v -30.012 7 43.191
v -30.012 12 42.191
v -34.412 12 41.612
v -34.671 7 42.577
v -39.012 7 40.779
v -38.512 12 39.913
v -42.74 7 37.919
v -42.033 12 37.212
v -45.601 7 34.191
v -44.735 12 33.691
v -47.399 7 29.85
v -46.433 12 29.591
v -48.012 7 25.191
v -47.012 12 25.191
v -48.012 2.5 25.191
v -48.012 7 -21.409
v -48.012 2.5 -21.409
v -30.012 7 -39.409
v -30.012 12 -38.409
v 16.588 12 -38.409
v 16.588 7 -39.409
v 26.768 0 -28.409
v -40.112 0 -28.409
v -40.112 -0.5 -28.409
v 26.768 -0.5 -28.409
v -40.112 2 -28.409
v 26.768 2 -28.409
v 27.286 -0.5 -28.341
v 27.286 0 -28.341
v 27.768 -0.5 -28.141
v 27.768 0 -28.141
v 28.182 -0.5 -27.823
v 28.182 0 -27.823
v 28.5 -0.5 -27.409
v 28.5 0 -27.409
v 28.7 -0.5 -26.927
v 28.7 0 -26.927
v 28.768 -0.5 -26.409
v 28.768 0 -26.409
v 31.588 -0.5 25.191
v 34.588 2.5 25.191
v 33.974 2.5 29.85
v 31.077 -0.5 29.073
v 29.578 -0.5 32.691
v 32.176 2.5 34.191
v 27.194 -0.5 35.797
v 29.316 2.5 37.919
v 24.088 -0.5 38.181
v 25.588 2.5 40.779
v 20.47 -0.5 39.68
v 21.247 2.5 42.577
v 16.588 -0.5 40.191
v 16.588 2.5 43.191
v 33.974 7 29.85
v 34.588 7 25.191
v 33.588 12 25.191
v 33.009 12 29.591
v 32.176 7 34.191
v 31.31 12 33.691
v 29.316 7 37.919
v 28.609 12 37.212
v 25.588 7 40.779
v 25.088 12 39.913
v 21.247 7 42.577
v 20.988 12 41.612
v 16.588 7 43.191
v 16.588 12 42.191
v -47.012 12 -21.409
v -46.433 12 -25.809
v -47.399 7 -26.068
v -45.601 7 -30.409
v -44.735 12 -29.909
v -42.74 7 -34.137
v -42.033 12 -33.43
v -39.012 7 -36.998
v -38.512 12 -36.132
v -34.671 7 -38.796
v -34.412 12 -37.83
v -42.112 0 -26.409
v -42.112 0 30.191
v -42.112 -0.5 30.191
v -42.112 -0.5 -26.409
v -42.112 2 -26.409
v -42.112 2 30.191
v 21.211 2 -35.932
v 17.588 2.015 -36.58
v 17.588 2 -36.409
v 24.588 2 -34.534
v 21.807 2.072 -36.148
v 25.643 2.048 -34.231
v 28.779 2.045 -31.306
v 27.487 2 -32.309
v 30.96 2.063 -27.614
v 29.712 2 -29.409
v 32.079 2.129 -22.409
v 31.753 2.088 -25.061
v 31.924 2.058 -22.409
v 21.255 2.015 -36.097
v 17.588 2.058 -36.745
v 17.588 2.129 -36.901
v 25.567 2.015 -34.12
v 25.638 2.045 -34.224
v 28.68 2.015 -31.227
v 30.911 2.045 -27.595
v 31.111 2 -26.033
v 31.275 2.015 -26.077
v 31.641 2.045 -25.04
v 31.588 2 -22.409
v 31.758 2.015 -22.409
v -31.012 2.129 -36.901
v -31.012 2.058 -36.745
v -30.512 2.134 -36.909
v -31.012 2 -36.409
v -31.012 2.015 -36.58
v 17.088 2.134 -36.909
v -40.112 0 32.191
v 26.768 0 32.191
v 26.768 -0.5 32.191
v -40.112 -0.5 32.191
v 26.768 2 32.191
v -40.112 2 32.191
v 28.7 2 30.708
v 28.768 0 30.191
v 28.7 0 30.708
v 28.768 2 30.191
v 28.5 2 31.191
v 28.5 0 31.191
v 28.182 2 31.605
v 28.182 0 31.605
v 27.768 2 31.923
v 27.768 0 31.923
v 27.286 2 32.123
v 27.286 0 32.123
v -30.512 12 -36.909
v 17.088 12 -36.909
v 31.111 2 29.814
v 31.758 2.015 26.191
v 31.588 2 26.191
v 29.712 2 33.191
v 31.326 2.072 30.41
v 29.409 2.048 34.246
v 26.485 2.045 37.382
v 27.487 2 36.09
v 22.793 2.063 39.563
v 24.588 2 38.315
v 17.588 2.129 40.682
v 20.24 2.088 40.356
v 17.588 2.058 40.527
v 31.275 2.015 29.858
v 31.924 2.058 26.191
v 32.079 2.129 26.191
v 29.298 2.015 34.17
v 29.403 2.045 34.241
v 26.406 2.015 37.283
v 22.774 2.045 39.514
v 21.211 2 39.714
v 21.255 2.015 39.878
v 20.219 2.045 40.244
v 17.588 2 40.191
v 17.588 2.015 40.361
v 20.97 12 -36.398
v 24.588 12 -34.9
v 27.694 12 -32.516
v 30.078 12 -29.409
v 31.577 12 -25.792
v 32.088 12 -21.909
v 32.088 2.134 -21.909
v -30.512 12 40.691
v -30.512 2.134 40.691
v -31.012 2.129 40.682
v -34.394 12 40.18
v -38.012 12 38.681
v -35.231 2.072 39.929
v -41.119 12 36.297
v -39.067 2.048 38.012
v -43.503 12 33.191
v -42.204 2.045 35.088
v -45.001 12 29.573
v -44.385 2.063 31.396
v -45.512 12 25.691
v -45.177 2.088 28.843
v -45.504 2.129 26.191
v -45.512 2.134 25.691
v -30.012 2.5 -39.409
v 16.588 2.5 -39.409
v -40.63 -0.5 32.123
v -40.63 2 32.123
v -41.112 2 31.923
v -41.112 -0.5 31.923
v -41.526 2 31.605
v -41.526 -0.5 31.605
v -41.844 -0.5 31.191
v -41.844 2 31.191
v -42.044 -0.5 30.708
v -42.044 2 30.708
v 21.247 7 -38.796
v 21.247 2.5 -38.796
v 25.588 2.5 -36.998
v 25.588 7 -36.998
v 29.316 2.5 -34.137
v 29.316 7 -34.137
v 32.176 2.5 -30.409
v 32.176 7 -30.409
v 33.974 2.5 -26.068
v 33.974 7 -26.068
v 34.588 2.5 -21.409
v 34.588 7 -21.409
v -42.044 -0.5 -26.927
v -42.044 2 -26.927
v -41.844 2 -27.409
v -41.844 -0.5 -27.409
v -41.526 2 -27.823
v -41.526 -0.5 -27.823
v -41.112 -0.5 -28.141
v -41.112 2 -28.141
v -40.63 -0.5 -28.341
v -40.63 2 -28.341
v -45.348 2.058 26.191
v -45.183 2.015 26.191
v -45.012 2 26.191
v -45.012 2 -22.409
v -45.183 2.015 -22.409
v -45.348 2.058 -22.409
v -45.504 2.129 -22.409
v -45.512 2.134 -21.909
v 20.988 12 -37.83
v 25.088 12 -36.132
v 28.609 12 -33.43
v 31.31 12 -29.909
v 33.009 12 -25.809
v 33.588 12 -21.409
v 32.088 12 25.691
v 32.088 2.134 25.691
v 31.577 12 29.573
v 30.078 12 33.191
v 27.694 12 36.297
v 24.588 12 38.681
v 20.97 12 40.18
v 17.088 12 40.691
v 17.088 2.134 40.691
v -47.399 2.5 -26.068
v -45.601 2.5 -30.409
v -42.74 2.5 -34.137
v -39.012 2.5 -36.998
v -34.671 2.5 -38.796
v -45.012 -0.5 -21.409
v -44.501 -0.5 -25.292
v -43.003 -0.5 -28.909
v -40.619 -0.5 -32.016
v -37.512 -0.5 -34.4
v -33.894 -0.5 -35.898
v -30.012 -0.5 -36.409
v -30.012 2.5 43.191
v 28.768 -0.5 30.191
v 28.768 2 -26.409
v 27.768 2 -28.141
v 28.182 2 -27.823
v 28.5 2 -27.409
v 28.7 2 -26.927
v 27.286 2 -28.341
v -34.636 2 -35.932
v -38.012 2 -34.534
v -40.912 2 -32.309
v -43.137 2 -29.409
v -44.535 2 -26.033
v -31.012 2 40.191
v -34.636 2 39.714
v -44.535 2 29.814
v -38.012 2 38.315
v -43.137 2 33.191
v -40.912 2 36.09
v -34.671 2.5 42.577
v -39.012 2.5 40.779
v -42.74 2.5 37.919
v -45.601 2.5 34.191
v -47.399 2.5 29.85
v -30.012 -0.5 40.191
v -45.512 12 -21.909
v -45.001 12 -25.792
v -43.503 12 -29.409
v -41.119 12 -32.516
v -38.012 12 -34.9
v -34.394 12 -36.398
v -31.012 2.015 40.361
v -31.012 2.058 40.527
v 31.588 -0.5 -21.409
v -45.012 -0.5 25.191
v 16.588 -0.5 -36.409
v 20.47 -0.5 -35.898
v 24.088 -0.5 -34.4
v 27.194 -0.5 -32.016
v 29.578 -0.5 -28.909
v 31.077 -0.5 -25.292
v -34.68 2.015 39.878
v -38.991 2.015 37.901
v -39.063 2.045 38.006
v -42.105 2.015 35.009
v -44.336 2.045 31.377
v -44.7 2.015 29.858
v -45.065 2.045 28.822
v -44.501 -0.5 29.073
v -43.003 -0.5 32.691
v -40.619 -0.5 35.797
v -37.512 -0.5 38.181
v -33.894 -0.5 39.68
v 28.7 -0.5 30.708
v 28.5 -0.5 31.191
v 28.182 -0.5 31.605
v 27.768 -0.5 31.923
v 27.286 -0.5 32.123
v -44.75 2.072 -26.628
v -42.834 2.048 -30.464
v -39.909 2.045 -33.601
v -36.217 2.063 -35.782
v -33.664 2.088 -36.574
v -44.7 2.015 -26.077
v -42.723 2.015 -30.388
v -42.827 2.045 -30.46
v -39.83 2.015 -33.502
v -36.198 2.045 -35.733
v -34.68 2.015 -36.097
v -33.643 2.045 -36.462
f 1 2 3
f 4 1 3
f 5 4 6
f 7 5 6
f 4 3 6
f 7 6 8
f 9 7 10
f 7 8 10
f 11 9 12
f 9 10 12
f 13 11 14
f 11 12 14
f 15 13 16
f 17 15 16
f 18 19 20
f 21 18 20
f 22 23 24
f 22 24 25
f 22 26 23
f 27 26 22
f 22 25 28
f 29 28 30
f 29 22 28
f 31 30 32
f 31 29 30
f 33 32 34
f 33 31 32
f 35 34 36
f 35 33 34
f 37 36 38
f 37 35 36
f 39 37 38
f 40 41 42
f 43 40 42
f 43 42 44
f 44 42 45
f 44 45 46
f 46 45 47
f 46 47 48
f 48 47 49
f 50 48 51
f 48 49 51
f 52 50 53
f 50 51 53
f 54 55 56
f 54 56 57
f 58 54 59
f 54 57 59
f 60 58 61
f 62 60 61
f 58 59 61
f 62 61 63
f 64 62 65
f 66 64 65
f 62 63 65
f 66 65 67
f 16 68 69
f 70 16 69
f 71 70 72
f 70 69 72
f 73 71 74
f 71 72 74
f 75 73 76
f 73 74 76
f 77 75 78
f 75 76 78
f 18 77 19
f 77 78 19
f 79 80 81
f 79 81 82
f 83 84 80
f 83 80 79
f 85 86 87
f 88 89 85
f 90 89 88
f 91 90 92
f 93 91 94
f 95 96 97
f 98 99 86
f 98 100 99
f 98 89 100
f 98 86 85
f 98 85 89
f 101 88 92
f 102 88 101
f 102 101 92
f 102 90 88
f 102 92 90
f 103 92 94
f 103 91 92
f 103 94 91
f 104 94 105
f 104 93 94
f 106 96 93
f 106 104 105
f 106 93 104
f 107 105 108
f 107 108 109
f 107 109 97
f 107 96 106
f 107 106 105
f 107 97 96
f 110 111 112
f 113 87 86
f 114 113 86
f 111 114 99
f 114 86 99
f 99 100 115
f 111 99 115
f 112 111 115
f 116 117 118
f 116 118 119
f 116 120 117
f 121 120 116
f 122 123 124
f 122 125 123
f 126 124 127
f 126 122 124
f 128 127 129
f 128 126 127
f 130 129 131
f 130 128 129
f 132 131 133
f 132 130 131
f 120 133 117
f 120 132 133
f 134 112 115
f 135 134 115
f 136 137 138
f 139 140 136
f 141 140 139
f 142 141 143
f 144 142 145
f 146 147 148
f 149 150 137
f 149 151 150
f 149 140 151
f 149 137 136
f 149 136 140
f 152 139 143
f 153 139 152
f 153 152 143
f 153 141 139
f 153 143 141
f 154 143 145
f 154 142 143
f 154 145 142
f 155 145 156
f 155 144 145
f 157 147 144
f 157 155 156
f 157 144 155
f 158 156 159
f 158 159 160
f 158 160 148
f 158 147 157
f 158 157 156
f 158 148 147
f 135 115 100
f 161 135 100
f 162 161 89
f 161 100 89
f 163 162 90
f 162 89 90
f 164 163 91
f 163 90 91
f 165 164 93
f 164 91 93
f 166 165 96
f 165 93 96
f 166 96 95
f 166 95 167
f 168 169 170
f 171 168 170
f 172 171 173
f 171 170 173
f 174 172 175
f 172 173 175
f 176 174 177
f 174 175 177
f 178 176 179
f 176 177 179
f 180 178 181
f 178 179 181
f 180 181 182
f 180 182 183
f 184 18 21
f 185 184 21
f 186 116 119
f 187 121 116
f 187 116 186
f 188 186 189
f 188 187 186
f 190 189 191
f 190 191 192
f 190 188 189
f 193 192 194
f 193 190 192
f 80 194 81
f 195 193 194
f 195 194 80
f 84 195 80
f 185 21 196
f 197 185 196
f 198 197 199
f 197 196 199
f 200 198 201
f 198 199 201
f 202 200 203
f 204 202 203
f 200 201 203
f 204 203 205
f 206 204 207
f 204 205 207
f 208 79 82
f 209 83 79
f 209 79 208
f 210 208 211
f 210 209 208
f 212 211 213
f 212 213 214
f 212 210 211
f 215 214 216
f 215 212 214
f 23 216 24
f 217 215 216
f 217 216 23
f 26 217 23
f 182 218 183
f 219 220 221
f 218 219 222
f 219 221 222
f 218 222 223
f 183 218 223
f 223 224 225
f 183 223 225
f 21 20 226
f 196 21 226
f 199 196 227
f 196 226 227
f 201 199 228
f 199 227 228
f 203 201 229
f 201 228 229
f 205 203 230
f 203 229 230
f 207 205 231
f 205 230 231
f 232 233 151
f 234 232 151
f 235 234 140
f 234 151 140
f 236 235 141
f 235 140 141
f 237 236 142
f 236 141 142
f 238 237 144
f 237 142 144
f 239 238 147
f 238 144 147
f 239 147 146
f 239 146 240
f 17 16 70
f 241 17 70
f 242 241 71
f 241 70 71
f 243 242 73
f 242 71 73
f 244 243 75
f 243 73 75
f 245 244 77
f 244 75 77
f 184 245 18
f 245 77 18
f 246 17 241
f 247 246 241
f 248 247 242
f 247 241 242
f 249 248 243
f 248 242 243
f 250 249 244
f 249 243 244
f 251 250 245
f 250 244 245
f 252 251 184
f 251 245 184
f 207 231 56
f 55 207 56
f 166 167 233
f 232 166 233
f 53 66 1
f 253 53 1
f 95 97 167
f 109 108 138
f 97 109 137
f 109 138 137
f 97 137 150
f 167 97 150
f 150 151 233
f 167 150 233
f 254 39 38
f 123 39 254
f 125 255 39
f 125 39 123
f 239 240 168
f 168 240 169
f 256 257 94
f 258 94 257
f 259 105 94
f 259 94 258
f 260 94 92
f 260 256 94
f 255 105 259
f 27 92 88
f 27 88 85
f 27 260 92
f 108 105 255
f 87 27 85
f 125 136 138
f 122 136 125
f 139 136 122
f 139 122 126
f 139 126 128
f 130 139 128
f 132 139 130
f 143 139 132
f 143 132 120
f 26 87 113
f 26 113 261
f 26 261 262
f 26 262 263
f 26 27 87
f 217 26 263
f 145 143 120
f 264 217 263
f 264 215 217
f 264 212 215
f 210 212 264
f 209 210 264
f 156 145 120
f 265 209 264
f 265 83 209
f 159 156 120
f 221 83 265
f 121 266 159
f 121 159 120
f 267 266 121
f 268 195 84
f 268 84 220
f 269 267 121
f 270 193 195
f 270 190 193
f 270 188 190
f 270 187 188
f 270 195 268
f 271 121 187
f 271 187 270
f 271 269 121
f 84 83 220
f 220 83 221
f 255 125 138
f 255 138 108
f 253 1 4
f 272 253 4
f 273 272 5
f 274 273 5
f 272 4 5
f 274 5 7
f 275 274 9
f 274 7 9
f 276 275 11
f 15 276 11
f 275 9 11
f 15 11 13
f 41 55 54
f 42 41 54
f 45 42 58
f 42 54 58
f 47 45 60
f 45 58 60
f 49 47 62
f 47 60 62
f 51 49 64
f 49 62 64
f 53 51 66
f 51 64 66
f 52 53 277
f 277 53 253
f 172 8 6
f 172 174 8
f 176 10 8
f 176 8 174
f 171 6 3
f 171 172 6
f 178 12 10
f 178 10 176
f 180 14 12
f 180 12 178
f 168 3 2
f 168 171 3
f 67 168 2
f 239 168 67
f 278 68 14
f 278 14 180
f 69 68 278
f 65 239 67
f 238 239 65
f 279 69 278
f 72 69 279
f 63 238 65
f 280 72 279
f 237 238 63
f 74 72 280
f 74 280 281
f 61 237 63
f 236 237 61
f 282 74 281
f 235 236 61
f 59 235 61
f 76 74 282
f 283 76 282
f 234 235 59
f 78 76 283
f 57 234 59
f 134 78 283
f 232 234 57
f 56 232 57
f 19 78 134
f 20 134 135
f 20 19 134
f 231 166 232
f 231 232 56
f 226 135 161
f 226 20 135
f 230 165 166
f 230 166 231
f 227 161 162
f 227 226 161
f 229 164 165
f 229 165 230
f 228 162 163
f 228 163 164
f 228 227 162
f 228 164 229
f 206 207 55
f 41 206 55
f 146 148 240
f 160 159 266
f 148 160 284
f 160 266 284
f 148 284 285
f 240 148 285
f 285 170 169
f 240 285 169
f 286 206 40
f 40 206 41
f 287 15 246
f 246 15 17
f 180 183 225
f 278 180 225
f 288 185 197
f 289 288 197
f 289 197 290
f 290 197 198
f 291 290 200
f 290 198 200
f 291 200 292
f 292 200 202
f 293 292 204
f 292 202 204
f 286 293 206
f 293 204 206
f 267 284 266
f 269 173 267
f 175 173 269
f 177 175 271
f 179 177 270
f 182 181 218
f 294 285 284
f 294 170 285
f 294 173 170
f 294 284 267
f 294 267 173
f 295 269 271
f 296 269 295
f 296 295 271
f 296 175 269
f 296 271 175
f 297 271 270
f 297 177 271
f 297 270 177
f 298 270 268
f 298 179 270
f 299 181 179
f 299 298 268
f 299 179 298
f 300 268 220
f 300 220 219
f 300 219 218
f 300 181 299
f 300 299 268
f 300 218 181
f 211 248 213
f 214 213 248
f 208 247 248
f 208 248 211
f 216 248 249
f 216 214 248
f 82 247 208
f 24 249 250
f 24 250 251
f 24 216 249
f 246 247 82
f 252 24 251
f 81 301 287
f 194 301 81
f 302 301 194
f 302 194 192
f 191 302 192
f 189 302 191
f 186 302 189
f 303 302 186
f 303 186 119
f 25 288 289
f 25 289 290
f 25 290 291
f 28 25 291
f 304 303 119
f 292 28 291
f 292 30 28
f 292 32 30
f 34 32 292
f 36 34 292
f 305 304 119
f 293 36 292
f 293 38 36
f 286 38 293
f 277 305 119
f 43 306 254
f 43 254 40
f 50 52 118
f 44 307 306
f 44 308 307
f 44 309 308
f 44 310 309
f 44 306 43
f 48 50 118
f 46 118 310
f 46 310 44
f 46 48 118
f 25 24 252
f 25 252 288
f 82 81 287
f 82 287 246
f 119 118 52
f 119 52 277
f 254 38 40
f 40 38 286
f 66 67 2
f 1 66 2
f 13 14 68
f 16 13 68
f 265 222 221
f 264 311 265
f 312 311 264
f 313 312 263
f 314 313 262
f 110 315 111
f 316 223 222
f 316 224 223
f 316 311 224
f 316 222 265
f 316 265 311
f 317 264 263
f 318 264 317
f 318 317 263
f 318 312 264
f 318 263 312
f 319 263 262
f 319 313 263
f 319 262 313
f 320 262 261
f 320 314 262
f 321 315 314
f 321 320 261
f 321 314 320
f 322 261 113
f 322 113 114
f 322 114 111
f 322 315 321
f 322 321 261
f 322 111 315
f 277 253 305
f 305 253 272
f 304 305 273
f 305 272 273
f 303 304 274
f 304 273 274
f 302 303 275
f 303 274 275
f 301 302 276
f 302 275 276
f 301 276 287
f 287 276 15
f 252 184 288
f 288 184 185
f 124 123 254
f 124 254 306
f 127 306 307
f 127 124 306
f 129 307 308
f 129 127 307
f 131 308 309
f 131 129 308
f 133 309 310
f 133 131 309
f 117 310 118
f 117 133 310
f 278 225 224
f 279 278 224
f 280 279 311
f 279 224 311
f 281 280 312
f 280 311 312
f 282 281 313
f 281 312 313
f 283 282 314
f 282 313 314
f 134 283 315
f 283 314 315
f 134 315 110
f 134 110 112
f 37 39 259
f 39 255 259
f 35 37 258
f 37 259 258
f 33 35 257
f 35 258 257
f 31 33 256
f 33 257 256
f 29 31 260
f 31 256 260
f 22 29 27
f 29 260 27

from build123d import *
from OCP.BRepFilletAPI import BRepFilletAPI_MakeChamfer

# Parameters (mm, degrees)
BOSS_EXTRUDE1_DEPTH = 12
BOSS_EXTRUDE2_DEPTH = 2
BOSS_EXTRUDE3_DEPTH = 2
FILLET1_R           = 1
CHAMFER2_SIZE       = 5
CHAMFER2_SIZE2      = 1
BOSS_EXTRUDE4_START = -2
SKETCH3_W           = 1.836045909
SKETCH3_H           = 61.241929872
SKETCH3_W_2         = 2.002550415
SKETCH3_H_2         = 60.908326167
BOSS_EXTRUDE4_DEPTH = 2
FILLET2_R           = 2
BOSS_EXTRUDE6_DEPTH = 0.5
CHAMFER3_SIZE       = 3
BOSS_EXTRUDE7_START = -9.956145
BOSS_EXTRUDE7_DEPTH = 9.956145


with BuildPart() as part:
    # Sketch1 → Boss-Extrude1 (new body)
    with BuildSketch(Plane(origin=(0, 0, 0), x_dir=(1, 0, 0), z_dir=(0, 1, 0))):
        with BuildLine():
            Line((-30.01220756, 39.409237307), (16.58779244, 39.409237307))
            ThreePointArc((16.58779244, 39.409237307), (29.315714501, 34.137159368), (34.58779244, 21.409237307))
            Line((34.58779244, 21.409237307), (34.58779244, -25.190762693))
            ThreePointArc((34.58779244, -25.190762693), (29.315714501, -37.918684754), (16.58779244, -43.190762693))
            Line((16.58779244, -43.190762693), (-30.01220756, -43.190762693))
            ThreePointArc((-30.01220756, -43.190762693), (-42.740129621, -37.918684754), (-48.01220756, -25.190762693))
            Line((-48.01220756, -25.190762693), (-48.01220756, 21.409237307))
            ThreePointArc((-48.01220756, 21.409237307), (-42.740129621, 34.137159368), (-30.01220756, 39.409237307))
        make_face()
        with BuildLine():
            ThreePointArc((-31.01220756, 37.409237307), (-41.618809278, 33.015839025), (-46.01220756, 22.409237307))
            Line((-46.01220756, 22.409237307), (-46.01220756, -26.190762693))
            ThreePointArc((-46.01220756, -26.190762693), (-41.618809278, -36.797364411), (-31.01220756, -41.190762693))
            Line((-31.01220756, -41.190762693), (17.58779244, -41.190762693))
            ThreePointArc((17.58779244, -41.190762693), (28.194394158, -36.797364411), (32.58779244, -26.190762693))
            Line((32.58779244, -26.190762693), (32.58779244, 22.409237307))
            ThreePointArc((32.58779244, 22.409237307), (28.194394158, 33.015839025), (17.58779244, 37.409237307))
            Line((17.58779244, 37.409237307), (-31.01220756, 37.409237307))
        make_face(mode=Mode.SUBTRACT)
    extrude(amount=BOSS_EXTRUDE1_DEPTH)

    # Sketch1<3> → Boss-Extrude2 (add)
    with BuildSketch(Plane(origin=(0, 0, 0), x_dir=(1, 0, 0), z_dir=(0, 1, 0))):
        with BuildLine():
            Line((-31.01220756, 37.409237307), (17.58779244, 37.409237307))
            ThreePointArc((17.58779244, 37.409237307), (28.194394158, 33.015839025), (32.58779244, 22.409237307))
            Line((32.58779244, 22.409237307), (32.58779244, -26.190762693))
            ThreePointArc((32.58779244, -26.190762693), (28.194394158, -36.797364411), (17.58779244, -41.190762693))
            Line((17.58779244, -41.190762693), (-31.01220756, -41.190762693))
            ThreePointArc((-31.01220756, -41.190762693), (-41.618809278, -36.797364411), (-46.01220756, -26.190762693))
            Line((-46.01220756, -26.190762693), (-46.01220756, 22.409237307))
            ThreePointArc((-46.01220756, 22.409237307), (-41.618809278, 33.015839025), (-31.01220756, 37.409237307))
        make_face()
        with BuildLine():
            ThreePointArc((-33.01220756, 35.409237307), (-40.790382153, 32.1874119), (-44.01220756, 24.409237307))
            Line((-44.01220756, 24.409237307), (-44.01220756, -28.190762693))
            ThreePointArc((-44.01220756, -28.190762693), (-40.790382153, -35.968937286), (-33.01220756, -39.190762693))
            Line((-33.01220756, -39.190762693), (19.58779244, -39.190762693))
            ThreePointArc((19.58779244, -39.190762693), (27.365967033, -35.968937286), (30.58779244, -28.190762693))
            Line((30.58779244, -28.190762693), (30.58779244, 24.409237307))
            ThreePointArc((30.58779244, 24.409237307), (27.365967033, 32.1874119), (19.58779244, 35.409237307))
            Line((19.58779244, 35.409237307), (-33.01220756, 35.409237307))
        make_face(mode=Mode.SUBTRACT)
    extrude(amount=BOSS_EXTRUDE2_DEPTH)

    # Sketch2 → Boss-Extrude3 (add)
    with BuildSketch(Plane.XZ):
        Polygon((-43.965284719, -28.409237307), (31.645799766, -28.409237307), (28.962058079, -33.229552195), (23.454257131, -35.92314828), (-39.267624427, -35.92314828), (-41.596405872, -34.261761517), align=None)
        Polygon((-43.464319503, 32.190762693), (31.986692978, 32.190762693), (24.084814063, 40.906543889), (12.932368974, 40.906543889), (-33.320922397, 40.906543889), (-40.968109046, 37.811254055), align=None)
    extrude(amount=-BOSS_EXTRUDE3_DEPTH)

    # Fillet1
    fillet1_edges = [part.edges().sort_by_distance(p)[0] for p in [
        (-6.71220756, 2, -37.409237307),
        (32.58779244, 2, 1.890762693),
        (28.194394158, 2, -33.015839025),
        (-41.618809278, 2, -33.015839025),
        (-46.01220756, 2, 1.890762693),
        (-41.618809278, 2, 36.797364411),
        (-6.71220756, 2, 41.190762693),
        (28.194394158, 2, 36.797364411),
    ]]
    fillet(fillet1_edges, radius=FILLET1_R)

    # Chamfer2: one chamfer whose edges measure the first distance from different faces: ONE call of the kernel's chamfer builder (chamfer() names one face for all edges)
    chamfer2_edges_1 = [part.edges().sort_by_distance(p)[0] for p in [
        (-6.71220756, 12, -39.409237307),
    ]]
    chamfer2_side_1 = [part.faces().sort_by_distance(p)[0] for p in [
        (-6.71220756, 6, -39.409237307),
    ]]
    chamfer2_edges_2 = [part.edges().sort_by_distance(p)[0] for p in [
        (-42.740129621, 12, -34.137159368),
    ]]
    chamfer2_side_2 = [part.faces().sort_by_distance(p)[0] for p in [
        (-42.740129621, 6, -34.137159368),
    ]]
    chamfer2_edges_3 = [part.edges().sort_by_distance(p)[0] for p in [
        (-48.01220756, 12, 1.890762693),
    ]]
    chamfer2_side_3 = [part.faces().sort_by_distance(p)[0] for p in [
        (-48.01220756, 6, 1.890762693),
    ]]
    chamfer2_edges_4 = [part.edges().sort_by_distance(p)[0] for p in [
        (-42.740129621, 12, 37.918684754),
    ]]
    chamfer2_side_4 = [part.faces().sort_by_distance(p)[0] for p in [
        (-42.740129621, 6, 37.918684754),
    ]]
    chamfer2_edges_5 = [part.edges().sort_by_distance(p)[0] for p in [
        (-6.71220756, 12, 43.190762693),
    ]]
    chamfer2_side_5 = [part.faces().sort_by_distance(p)[0] for p in [
        (-6.71220756, 6, 43.190762693),
    ]]
    chamfer2_edges_6 = [part.edges().sort_by_distance(p)[0] for p in [
        (29.315714501, 12, 37.918684754),
    ]]
    chamfer2_side_6 = [part.faces().sort_by_distance(p)[0] for p in [
        (29.315714501, 6, 37.918684754),
    ]]
    chamfer2_edges_7 = [part.edges().sort_by_distance(p)[0] for p in [
        (34.58779244, 12, 1.890762693),
    ]]
    chamfer2_side_7 = [part.faces().sort_by_distance(p)[0] for p in [
        (34.58779244, 6, 1.890762693),
    ]]
    chamfer2_edges_8 = [part.edges().sort_by_distance(p)[0] for p in [
        (29.315714501, 12, -34.137159368),
    ]]
    chamfer2_side_8 = [part.faces().sort_by_distance(p)[0] for p in [
        (29.315714501, 6, -34.137159368),
    ]]
    chamfer2 = BRepFilletAPI_MakeChamfer(part.part.solid().wrapped)
    for e in chamfer2_edges_1:
        chamfer2.Add(CHAMFER2_SIZE, CHAMFER2_SIZE2, e.wrapped, chamfer2_side_1[0].wrapped)  # the first distance lies on this face
    for e in chamfer2_edges_2:
        chamfer2.Add(CHAMFER2_SIZE, CHAMFER2_SIZE2, e.wrapped, chamfer2_side_2[0].wrapped)  # the first distance lies on this face
    for e in chamfer2_edges_3:
        chamfer2.Add(CHAMFER2_SIZE, CHAMFER2_SIZE2, e.wrapped, chamfer2_side_3[0].wrapped)  # the first distance lies on this face
    for e in chamfer2_edges_4:
        chamfer2.Add(CHAMFER2_SIZE, CHAMFER2_SIZE2, e.wrapped, chamfer2_side_4[0].wrapped)  # the first distance lies on this face
    for e in chamfer2_edges_5:
        chamfer2.Add(CHAMFER2_SIZE, CHAMFER2_SIZE2, e.wrapped, chamfer2_side_5[0].wrapped)  # the first distance lies on this face
    for e in chamfer2_edges_6:
        chamfer2.Add(CHAMFER2_SIZE, CHAMFER2_SIZE2, e.wrapped, chamfer2_side_6[0].wrapped)  # the first distance lies on this face
    for e in chamfer2_edges_7:
        chamfer2.Add(CHAMFER2_SIZE, CHAMFER2_SIZE2, e.wrapped, chamfer2_side_7[0].wrapped)  # the first distance lies on this face
    for e in chamfer2_edges_8:
        chamfer2.Add(CHAMFER2_SIZE, CHAMFER2_SIZE2, e.wrapped, chamfer2_side_8[0].wrapped)  # the first distance lies on this face
    add(Compound.cast(chamfer2.Shape()), mode=Mode.REPLACE)

    # Sketch3 → Boss-Extrude4 (add)
    with BuildSketch(Plane.XZ.offset(BOSS_EXTRUDE4_START)):
        with Locations((29.686081831, 1.878123924)):
            Rectangle(SKETCH3_W, SKETCH3_H)
        with Locations((-43.113419178, 2.044925776)):
            Rectangle(SKETCH3_W_2, SKETCH3_H_2)
    extrude(amount=BOSS_EXTRUDE4_DEPTH)

    # Fillet2
    fillet2_edges = [part.edges().sort_by_distance(p)[0] for p in [
        (28.768058876, 1, 32.190762693),
        (28.768058876, 1, -28.409237307),
        (-42.11214397, 1, 32.190762693),
        (-42.11214397, 1, -28.409237307),
    ]]
    fillet(fillet2_edges, radius=FILLET2_R)

    # Sketch4 → Boss-Extrude6 (add)
    with BuildSketch(Plane.XZ):
        with BuildLine():
            Line((-30.01220756, -39.409237307), (16.58779244, -39.409237307))
            ThreePointArc((16.58779244, -39.409237307), (29.315714501, -34.137159368), (34.58779244, -21.409237307))
            Line((34.58779244, -21.409237307), (34.58779244, 25.190762693))
            ThreePointArc((34.58779244, 25.190762693), (29.315714501, 37.918684754), (16.58779244, 43.190762693))
            Line((16.58779244, 43.190762693), (-30.01220756, 43.190762693))
            ThreePointArc((-30.01220756, 43.190762693), (-42.740129621, 37.918684754), (-48.01220756, 25.190762693))
            Line((-48.01220756, 25.190762693), (-48.01220756, -21.409237307))
            ThreePointArc((-48.01220756, -21.409237307), (-42.740129621, -34.137159368), (-30.01220756, -39.409237307))
        make_face()
        with BuildLine():
            Line((-40.11214397, -28.409237307), (26.768058876, -28.409237307))
            ThreePointArc((26.768058876, -28.409237307), (28.182272439, -27.823450869), (28.768058876, -26.409237307))
            Line((28.768058876, -26.409237307), (28.768058876, 30.190762693))
            ThreePointArc((28.768058876, 30.190762693), (28.182272439, 31.604976255), (26.768058876, 32.190762693))
            Line((26.768058876, 32.190762693), (-40.11214397, 32.190762693))
            ThreePointArc((-40.11214397, 32.190762693), (-41.526357532, 31.604976255), (-42.11214397, 30.190762693))
            Line((-42.11214397, 30.190762693), (-42.11214397, -26.409237307))
            ThreePointArc((-42.11214397, -26.409237307), (-41.526357532, -27.823450869), (-40.11214397, -28.409237307))
        make_face(mode=Mode.SUBTRACT)
    extrude(amount=BOSS_EXTRUDE6_DEPTH)

    # Chamfer3
    chamfer3_edges = [part.edges().sort_by_distance(p)[0] for p in [
        (-42.740129621, -0.5, -34.137159368),
        (-6.71220756, -0.5, -39.409237307),
        (29.315714501, -0.5, -34.137159368),
        (34.58779244, -0.5, 1.890762693),
        (29.315714501, -0.5, 37.918684754),
        (-6.71220756, -0.5, 43.190762693),
        (-42.740129621, -0.5, 37.918684754),
        (-48.01220756, -0.5, 1.890762693),
    ]]
    chamfer(chamfer3_edges, length=CHAMFER3_SIZE)

    # Sketch5 → Boss-Extrude7 (add)
    with BuildSketch(Plane(origin=(0, 12, 0), x_dir=(1, 0, 0), z_dir=(0, 1, 0)).offset(BOSS_EXTRUDE7_START)):
        with BuildLine():
            Line((17.58779244, 37.409237307), (-31.01220756, 37.409237307))
            ThreePointArc((-31.01220756, 37.409237307), (-41.618809278, 33.015839025), (-46.01220756, 22.409237307))
            Line((-46.01220756, 22.409237307), (-46.01220756, -26.190762693))
            ThreePointArc((-46.01220756, -26.190762693), (-41.618809278, -36.797364411), (-31.01220756, -41.190762693))
            Line((-31.01220756, -41.190762693), (17.58779244, -41.190762693))
            ThreePointArc((17.58779244, -41.190762693), (28.194394158, -36.797364411), (32.58779244, -26.190762693))
            Line((32.58779244, -26.190762693), (32.58779244, 22.409237307))
            ThreePointArc((32.58779244, 22.409237307), (28.194394158, 33.015839025), (17.58779244, 37.409237307))
        make_face()
        with BuildLine():
            Line((-30.51220756, 36.909237307), (17.08779244, 36.909237307))
            ThreePointArc((17.08779244, 36.909237307), (27.694394158, 32.515839025), (32.08779244, 21.909237307))
            Line((32.08779244, 21.909237307), (32.08779244, -25.690762693))
            ThreePointArc((32.08779244, -25.690762693), (27.694394158, -36.297364411), (17.08779244, -40.690762693))
            Line((17.08779244, -40.690762693), (-30.51220756, -40.690762693))
            ThreePointArc((-30.51220756, -40.690762693), (-41.118809278, -36.297364411), (-45.51220756, -25.690762693))
            Line((-45.51220756, -25.690762693), (-45.51220756, 21.909237307))
            ThreePointArc((-45.51220756, 21.909237307), (-41.118809278, 32.515839025), (-30.51220756, 36.909237307))
        make_face(mode=Mode.SUBTRACT)
    extrude(amount=BOSS_EXTRUDE7_DEPTH)


solid = part.part
